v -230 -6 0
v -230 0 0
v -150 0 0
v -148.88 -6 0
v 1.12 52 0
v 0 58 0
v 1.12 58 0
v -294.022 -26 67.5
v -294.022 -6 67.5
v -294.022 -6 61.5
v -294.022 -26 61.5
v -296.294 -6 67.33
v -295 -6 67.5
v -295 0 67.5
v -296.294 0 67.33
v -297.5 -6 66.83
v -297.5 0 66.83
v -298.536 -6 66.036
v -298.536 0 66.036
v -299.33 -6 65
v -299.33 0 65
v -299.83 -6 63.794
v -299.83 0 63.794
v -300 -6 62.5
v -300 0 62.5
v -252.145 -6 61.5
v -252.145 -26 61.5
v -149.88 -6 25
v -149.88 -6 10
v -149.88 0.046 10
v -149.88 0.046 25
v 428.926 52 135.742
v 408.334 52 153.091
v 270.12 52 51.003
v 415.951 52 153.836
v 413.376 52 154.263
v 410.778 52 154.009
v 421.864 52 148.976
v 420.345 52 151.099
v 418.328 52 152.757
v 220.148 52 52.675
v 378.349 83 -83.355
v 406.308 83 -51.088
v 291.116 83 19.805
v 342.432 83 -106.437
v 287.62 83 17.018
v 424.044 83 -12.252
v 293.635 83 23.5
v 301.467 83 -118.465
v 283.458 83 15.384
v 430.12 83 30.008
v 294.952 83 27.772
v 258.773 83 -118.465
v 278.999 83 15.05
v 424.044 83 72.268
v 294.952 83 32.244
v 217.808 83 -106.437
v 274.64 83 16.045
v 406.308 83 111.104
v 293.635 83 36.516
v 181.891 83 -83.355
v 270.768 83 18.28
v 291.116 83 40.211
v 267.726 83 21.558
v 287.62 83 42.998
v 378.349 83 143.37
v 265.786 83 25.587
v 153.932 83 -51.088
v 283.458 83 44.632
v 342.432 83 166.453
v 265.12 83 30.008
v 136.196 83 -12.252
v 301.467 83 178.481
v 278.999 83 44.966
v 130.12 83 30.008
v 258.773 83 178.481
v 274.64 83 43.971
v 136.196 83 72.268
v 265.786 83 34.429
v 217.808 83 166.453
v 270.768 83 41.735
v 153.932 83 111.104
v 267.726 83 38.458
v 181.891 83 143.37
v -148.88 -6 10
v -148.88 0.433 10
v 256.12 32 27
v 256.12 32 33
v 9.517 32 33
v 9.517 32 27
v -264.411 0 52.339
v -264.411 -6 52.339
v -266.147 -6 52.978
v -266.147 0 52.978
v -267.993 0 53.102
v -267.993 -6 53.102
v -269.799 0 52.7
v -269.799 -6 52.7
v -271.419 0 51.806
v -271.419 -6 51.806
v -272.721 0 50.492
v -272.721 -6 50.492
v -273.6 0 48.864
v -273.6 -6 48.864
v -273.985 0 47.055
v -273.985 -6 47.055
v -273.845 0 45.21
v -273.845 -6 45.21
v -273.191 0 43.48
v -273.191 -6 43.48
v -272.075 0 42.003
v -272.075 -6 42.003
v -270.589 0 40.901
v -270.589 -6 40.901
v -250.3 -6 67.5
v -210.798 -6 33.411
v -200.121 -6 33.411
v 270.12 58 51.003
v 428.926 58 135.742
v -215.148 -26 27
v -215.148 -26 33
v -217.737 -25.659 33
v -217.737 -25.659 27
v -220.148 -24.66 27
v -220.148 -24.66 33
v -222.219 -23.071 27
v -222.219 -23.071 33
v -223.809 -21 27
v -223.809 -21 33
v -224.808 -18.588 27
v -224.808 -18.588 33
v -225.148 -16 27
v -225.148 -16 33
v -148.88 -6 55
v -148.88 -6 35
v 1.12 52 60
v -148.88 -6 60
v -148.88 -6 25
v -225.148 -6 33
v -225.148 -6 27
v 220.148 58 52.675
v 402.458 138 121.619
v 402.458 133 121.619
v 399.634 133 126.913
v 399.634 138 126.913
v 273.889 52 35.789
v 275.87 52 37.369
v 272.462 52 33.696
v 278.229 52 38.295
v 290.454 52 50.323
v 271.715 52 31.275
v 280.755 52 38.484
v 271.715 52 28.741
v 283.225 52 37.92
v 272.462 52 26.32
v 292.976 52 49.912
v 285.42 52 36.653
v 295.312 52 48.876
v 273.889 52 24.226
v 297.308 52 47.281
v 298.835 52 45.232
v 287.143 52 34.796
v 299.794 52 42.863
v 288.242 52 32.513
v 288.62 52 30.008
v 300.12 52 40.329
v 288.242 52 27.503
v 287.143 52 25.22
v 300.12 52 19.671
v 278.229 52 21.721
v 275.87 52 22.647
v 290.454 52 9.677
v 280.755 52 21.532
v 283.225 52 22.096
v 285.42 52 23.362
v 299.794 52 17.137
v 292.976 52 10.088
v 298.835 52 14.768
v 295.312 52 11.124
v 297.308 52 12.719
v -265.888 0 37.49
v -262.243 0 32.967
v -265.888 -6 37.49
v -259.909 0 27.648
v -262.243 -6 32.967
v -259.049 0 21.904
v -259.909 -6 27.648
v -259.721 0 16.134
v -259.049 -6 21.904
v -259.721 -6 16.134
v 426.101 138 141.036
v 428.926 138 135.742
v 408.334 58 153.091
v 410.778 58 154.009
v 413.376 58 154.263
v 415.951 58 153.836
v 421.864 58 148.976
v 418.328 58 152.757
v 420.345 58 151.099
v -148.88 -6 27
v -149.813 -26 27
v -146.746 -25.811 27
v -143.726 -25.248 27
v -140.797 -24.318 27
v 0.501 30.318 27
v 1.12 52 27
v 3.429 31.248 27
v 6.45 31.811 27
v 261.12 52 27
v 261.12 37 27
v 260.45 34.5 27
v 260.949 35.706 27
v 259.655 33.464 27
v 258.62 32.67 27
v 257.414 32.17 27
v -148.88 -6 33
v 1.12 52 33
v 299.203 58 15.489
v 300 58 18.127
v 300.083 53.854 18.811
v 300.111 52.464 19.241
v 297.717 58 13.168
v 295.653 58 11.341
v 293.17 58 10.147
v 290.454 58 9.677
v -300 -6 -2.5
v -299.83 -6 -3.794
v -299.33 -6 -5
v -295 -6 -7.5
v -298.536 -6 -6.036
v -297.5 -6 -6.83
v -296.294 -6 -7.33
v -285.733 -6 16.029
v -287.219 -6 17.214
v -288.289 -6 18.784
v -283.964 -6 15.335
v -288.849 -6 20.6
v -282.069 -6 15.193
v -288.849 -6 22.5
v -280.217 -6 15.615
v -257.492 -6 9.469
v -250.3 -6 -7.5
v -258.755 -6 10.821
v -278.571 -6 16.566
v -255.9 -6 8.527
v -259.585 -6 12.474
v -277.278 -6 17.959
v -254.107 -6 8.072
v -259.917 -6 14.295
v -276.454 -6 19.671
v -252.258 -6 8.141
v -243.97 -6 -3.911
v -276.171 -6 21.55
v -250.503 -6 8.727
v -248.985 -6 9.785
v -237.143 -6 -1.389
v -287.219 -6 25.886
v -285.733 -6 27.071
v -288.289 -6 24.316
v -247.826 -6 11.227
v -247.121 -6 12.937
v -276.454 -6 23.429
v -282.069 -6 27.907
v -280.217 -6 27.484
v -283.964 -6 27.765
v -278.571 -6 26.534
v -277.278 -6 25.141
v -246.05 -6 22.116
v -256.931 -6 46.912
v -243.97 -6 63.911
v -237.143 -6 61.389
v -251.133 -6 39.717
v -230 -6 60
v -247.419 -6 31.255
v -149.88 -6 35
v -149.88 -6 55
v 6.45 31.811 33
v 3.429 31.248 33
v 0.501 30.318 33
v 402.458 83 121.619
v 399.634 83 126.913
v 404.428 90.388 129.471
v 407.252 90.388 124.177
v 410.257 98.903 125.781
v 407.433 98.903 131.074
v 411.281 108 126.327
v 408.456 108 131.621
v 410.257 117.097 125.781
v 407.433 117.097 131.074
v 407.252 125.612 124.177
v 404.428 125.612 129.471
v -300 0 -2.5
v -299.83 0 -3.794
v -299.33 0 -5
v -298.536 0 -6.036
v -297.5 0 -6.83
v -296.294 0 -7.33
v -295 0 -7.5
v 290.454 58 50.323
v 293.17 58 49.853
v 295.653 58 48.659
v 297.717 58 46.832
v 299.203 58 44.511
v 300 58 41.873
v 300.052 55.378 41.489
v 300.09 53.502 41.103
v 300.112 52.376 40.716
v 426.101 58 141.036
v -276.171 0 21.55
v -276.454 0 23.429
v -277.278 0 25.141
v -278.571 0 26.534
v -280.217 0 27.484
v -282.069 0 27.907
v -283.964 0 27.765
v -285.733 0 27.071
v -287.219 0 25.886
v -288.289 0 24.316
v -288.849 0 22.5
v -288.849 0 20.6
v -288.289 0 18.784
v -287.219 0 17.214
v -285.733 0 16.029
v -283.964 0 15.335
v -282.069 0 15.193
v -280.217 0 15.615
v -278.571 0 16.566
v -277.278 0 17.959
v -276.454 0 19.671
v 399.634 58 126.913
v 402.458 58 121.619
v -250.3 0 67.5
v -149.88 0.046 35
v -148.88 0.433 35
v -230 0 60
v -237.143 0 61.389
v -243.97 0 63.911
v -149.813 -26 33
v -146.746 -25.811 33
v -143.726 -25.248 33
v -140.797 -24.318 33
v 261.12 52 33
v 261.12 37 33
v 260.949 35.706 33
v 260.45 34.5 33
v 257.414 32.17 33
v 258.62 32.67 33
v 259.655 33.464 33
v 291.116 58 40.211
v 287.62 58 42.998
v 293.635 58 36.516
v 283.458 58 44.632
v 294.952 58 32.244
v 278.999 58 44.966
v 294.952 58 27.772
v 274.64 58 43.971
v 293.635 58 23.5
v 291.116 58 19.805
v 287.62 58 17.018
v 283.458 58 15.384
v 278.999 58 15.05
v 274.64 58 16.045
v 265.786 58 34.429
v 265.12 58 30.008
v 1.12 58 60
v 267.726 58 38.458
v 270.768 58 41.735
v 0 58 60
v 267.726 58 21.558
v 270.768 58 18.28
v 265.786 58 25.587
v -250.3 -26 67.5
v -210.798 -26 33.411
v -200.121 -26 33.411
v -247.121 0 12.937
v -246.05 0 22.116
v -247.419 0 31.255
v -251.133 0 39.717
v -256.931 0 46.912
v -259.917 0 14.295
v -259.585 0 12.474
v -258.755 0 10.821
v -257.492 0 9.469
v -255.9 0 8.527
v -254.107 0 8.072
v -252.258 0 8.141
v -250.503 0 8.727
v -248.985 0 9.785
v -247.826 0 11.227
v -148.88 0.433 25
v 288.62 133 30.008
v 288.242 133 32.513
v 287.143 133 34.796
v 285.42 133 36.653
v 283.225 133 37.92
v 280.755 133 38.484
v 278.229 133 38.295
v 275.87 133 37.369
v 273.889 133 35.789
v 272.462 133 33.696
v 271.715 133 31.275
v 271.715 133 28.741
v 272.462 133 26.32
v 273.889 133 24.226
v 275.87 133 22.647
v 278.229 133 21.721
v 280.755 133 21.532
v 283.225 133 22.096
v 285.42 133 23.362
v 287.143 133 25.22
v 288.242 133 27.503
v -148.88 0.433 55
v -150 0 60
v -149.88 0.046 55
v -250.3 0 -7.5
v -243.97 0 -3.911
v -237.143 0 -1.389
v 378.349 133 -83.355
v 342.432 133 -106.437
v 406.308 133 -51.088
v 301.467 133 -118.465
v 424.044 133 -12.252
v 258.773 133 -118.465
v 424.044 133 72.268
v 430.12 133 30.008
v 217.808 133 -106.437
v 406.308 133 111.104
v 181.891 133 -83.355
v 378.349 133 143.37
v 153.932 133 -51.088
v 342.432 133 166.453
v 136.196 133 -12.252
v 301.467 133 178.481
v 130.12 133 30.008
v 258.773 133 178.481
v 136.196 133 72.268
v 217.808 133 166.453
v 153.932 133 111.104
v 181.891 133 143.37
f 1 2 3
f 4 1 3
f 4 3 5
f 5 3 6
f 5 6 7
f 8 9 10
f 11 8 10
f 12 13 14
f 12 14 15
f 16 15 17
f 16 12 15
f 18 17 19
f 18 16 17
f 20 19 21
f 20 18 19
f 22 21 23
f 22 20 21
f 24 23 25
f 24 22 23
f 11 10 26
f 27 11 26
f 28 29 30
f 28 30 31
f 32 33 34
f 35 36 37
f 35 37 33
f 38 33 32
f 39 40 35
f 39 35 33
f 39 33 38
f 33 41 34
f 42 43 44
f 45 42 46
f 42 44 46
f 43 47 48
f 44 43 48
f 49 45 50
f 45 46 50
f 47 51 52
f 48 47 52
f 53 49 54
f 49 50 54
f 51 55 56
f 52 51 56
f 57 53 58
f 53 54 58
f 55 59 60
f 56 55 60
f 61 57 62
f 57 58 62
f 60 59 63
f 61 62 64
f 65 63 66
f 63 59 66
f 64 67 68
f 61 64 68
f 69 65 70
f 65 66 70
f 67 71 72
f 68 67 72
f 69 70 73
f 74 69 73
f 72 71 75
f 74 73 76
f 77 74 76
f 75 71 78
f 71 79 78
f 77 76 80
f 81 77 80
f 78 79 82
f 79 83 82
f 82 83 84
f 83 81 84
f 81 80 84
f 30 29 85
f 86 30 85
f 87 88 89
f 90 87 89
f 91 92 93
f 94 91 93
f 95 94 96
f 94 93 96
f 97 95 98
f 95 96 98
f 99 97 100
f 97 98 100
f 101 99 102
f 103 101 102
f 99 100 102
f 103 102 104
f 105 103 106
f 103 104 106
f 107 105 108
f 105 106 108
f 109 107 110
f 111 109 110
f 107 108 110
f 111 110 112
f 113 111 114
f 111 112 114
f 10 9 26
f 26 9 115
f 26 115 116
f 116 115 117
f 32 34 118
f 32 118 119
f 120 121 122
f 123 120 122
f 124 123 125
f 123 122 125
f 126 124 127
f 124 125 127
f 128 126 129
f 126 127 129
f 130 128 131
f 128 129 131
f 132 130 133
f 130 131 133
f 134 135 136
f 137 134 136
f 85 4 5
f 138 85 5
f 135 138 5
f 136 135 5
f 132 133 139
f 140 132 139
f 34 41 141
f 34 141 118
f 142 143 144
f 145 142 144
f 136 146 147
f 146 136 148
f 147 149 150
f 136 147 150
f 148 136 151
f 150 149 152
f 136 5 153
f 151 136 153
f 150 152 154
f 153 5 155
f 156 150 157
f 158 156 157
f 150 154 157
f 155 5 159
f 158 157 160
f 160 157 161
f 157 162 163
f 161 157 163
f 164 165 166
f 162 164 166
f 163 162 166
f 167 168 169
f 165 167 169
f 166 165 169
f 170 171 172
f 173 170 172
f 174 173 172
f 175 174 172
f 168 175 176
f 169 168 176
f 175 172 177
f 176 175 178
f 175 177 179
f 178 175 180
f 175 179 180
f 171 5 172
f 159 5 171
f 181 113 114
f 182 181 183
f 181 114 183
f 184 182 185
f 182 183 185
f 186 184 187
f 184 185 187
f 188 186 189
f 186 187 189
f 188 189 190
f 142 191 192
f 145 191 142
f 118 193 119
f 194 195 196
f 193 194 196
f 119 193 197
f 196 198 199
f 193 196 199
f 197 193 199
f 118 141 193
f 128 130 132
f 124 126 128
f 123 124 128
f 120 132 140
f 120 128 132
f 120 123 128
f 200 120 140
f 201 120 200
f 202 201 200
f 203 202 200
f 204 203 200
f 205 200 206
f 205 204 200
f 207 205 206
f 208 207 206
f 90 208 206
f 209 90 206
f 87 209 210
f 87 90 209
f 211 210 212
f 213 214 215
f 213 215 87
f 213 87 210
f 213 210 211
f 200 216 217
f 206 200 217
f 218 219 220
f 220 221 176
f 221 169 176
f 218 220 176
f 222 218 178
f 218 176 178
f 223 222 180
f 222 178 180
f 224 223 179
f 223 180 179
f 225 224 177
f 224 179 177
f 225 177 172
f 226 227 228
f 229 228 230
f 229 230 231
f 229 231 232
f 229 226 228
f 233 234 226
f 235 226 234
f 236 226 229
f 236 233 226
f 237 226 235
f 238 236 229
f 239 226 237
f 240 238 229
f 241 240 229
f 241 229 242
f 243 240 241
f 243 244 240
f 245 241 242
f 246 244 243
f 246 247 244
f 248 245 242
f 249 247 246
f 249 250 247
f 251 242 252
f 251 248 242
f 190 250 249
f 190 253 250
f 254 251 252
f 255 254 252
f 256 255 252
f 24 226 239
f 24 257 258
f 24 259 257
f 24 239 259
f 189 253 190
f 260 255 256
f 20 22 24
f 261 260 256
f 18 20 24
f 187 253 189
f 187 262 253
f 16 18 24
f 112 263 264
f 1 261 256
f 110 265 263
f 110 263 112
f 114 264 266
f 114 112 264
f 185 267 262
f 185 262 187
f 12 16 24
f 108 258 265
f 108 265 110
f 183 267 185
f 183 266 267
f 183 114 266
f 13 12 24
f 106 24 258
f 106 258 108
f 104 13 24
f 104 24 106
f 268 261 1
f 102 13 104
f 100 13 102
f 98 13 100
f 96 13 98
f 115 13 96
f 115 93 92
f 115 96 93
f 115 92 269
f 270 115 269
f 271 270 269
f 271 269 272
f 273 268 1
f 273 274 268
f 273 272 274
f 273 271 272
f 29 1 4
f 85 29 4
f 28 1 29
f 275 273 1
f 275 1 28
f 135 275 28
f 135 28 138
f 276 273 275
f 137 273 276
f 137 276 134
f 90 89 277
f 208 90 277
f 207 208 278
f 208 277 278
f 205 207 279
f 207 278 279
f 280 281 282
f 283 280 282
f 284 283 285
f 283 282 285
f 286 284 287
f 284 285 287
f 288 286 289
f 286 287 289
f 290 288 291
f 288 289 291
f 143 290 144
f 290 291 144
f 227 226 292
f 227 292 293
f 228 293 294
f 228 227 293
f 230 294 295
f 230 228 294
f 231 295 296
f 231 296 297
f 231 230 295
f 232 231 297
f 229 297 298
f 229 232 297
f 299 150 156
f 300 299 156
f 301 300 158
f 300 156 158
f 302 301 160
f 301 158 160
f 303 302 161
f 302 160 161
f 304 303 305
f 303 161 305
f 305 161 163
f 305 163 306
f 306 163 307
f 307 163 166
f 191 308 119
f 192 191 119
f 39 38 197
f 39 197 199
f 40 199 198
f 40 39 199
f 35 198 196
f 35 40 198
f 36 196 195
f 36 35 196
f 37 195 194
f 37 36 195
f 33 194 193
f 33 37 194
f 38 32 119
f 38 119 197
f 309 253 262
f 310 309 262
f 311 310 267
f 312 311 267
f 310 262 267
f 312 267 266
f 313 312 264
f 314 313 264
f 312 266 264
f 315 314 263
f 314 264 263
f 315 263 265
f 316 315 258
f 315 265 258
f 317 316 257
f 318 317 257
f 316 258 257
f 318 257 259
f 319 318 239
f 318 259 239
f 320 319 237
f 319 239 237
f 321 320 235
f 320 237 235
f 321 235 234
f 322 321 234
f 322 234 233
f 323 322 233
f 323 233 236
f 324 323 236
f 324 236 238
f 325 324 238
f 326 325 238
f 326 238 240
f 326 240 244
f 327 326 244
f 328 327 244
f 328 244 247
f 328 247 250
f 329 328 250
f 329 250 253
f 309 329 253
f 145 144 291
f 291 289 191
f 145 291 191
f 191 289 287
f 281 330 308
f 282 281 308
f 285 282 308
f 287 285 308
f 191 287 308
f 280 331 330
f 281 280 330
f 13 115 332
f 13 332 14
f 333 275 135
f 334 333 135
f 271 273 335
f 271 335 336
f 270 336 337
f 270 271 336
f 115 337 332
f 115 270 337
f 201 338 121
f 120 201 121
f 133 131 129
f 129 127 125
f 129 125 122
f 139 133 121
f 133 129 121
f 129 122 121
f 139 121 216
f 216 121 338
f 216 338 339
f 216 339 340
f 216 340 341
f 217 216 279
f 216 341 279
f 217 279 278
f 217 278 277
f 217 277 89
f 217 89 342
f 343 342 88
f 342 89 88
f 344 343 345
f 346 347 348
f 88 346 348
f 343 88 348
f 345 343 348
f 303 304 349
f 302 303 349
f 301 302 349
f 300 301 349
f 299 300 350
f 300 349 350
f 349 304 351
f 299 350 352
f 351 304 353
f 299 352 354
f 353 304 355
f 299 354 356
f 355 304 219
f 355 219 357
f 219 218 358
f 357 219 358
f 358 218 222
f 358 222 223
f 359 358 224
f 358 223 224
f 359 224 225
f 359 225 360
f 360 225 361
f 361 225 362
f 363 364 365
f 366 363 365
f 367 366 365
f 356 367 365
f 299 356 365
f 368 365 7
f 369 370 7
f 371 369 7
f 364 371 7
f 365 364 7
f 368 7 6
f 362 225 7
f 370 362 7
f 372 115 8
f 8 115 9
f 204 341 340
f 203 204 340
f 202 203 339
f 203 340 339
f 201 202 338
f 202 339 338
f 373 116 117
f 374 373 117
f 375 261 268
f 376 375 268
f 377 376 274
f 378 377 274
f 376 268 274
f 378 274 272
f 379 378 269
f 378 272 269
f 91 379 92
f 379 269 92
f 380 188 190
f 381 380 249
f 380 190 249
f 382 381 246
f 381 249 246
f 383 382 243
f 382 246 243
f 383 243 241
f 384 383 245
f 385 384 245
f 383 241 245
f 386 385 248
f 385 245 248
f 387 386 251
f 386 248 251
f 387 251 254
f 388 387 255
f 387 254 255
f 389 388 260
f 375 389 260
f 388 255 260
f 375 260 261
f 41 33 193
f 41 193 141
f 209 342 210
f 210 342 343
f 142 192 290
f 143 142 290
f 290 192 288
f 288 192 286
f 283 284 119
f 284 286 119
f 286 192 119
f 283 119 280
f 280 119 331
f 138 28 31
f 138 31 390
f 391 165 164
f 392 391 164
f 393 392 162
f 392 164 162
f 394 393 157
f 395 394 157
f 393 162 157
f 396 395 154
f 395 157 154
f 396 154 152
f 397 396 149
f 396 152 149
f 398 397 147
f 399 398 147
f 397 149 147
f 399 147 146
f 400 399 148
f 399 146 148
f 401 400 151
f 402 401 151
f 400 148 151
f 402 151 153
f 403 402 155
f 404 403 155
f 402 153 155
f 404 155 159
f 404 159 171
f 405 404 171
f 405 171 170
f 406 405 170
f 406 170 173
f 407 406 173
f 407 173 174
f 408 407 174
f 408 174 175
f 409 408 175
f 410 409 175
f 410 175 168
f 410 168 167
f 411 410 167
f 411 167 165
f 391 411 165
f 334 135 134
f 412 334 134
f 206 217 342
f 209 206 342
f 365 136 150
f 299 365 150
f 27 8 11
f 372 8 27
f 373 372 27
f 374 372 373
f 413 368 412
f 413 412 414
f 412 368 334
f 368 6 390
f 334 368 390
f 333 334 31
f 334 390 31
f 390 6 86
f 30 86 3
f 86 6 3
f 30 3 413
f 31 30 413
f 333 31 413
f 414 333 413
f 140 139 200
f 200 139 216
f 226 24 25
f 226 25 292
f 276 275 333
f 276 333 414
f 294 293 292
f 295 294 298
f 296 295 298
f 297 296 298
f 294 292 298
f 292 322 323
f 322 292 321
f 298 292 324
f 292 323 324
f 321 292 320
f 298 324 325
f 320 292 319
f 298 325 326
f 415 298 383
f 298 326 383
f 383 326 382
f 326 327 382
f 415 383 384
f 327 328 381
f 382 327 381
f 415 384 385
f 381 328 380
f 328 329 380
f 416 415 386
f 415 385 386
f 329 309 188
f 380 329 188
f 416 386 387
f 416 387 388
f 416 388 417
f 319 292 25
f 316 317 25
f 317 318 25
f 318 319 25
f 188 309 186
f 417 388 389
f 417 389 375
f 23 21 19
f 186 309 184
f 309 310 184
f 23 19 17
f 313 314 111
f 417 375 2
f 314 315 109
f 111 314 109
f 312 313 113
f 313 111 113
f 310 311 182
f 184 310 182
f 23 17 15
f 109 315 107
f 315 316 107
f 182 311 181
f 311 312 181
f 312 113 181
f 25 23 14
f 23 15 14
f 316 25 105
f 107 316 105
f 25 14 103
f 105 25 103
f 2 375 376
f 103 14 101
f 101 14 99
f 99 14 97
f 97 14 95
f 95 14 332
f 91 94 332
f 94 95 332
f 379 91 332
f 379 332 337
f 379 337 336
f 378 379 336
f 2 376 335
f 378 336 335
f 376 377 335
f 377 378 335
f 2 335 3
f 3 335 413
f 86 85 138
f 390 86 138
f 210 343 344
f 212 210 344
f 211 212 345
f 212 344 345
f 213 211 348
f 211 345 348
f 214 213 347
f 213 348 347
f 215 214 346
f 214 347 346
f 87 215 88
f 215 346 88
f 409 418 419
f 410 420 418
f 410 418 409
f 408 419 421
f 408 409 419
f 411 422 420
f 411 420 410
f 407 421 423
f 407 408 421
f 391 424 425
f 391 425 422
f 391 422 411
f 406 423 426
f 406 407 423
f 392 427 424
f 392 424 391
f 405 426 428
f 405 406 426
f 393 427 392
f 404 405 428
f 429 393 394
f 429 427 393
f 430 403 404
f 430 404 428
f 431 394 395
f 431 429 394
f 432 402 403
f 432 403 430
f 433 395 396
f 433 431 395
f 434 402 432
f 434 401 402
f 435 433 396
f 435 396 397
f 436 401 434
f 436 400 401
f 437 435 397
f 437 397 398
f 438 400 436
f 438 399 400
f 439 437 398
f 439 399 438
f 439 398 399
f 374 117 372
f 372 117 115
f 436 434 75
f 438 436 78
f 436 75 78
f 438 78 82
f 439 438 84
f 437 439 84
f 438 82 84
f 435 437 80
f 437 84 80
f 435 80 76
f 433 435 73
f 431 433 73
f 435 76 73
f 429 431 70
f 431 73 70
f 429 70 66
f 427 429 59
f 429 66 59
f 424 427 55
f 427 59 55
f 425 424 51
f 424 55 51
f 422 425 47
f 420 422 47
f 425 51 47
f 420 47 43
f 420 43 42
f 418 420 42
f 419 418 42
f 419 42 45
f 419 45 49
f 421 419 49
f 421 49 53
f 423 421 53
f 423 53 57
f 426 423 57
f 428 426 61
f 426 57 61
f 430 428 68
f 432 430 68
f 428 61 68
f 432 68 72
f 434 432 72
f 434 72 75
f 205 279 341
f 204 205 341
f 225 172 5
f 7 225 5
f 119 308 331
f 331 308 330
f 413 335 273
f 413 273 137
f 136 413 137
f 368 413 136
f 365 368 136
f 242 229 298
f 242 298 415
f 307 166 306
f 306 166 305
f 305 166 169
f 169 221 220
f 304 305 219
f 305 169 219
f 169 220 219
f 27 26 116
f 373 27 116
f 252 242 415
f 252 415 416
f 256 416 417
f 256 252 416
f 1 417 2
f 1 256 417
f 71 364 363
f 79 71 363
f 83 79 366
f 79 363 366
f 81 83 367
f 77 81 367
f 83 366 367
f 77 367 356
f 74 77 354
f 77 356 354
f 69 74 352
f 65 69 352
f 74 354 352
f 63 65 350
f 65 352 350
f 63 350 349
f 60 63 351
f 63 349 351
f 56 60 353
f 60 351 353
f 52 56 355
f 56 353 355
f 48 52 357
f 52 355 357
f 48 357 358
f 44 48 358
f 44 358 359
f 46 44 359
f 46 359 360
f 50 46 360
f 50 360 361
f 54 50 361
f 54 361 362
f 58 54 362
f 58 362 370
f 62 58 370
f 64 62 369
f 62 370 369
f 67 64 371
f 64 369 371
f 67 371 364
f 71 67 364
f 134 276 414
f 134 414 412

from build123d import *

# Parameters (mm, degrees)
F1_DEPTH  = 60
F3_R      = 8.25
F4_DEPTH  = 25
F5_DEPTH  = 6
F6_R      = 6.375
F7_DEPTH  = 25
F10_DEPTH = 6
F11_DEPTH = 6
F12_DEPTH = 25
F13_DEPTH = 25
F14_W     = 1
F14_H     = 20
F14_H_2   = 15
F15_DEPTH = 25
F17_DEPTH = 20
F18_R     = 15
F19_DEPTH = 25
F21_DEPTH = 50
F23_DEPTH = 6
F25_DEPTH = 80
F27_DEPTH = 25
F28_R     = 8.5
F29_DEPTH = 86.001


# Not quite as in the source:
# - a feature names something its author has since deleted; it is built from what else it names


with BuildPart() as f1:
    # F0 (on Top) → F1 (new body)
    with BuildSketch(Plane.XY):
        Polygon((-150, 0), (-300, 0), (-300, -6), (-148.8803913162, -6), (1.1196086838, 52), (300.12, 52), (300, 58), (0, 58), align=None)
    extrude(amount=F1_DEPTH)

    # F3 (on face) → F4 (cut)
    with BuildSketch(Plane.XZ.offset(-52)):
        with BuildLine():
            Line((300.12, 60), (1.1196086838, 60))
            Line((1.1196086838, 60), (290.4542608309, 50.3232684455))
            ThreePointArc((290.4542608309, 50.3232684455), (297.3082754646, 47.2807408597), (300.12, 40.3288565219))
            Line((300.12, 40.3288565219), (300.12, 60))
        make_face()
        with BuildLine():
            Line((290.4542608309, 9.6767315545), (1.1196086838, 0))
            Line((1.1196086838, 0), (300.12, 0))
            Line((300.12, 0), (300.12, 19.6711434781))
            ThreePointArc((300.12, 19.6711434781), (297.3082754646, 12.7192591403), (290.4542608309, 9.6767315545))
        make_face()
        with Locations((280.12, 30.0079316213)):
            Circle(F3_R)
    extrude(amount=-F4_DEPTH, mode=Mode.SUBTRACT)

    # F2 (on face) → F5 (join)
    with BuildSketch(Plane.XZ.offset(6)):
        with BuildLine():
            Line((-250.3, 67.5), (-295, 67.5))
            ThreePointArc((-295, 67.5), (-298.5355339059, 66.0355339059), (-300, 62.5))
            Line((-300, 62.5), (-300, 60))
            Line((-300, 60), (-230, 60))
            ThreePointArc((-230, 60), (-240.6075702178, 62.5115099439), (-250.3, 67.5))
        make_face()
    extrude(amount=-F5_DEPTH)

    # F6 (on face) → F7 (cut)
    with BuildSketch(Plane.XZ.offset(6)):
        with BuildLine():
            ThreePointArc((-259.7213383401, 16.1343621796), (-255.0196238496, 8.2353824448), (-247.1206441149, 12.9370969353))
            ThreePointArc((-247.1206441149, 12.9370969353), (-248.9955051627, 35.6089750865), (-264.4106548881, 52.339256668))
            ThreePointArc((-264.4106548881, 52.339256668), (-273.2189113282, 49.7096904517), (-270.5893451119, 40.9014340116))
            ThreePointArc((-270.5893451119, 40.9014340116), (-260.8998224273, 30.3852570175), (-259.7213383401, 16.1343621796))
        make_face()
        with Locations((-282.545583065, 21.5497146659)):
            Circle(F6_R)
    extrude(amount=-F7_DEPTH, mode=Mode.SUBTRACT)

    # F2 (on face) → F11 (join)
    with BuildSketch(Plane.XZ.offset(6)):
        with BuildLine():
            Line((-250.3, 67.5), (-295, 67.5))
            ThreePointArc((-295, 67.5), (-298.5355339059, 66.0355339059), (-300, 62.5))
            Line((-300, 62.5), (-300, 60))
            Line((-300, 60), (-300, 0))
            Line((-300, 0), (-300, -2.5))
            ThreePointArc((-300, -2.5), (-298.5355339059, -6.0355339059), (-295, -7.5))
            Line((-295, -7.5), (-250.3, -7.5))
            ThreePointArc((-250.3, -7.5), (-240.6075702178, -2.5115099439), (-230, 0))
            Line((-230, 0), (-230, 60))
            ThreePointArc((-230, 60), (-240.6075702178, 62.5115099439), (-250.3, 67.5))
        make_face()
    extrude(amount=-F11_DEPTH)

    # F6 (on face) → F12 (cut)
    with BuildSketch(Plane.XZ.offset(6)):
        with BuildLine():
            ThreePointArc((-259.7213383401, 16.1343621796), (-255.0196238496, 8.2353824448), (-247.1206441149, 12.9370969353))
            ThreePointArc((-247.1206441149, 12.9370969353), (-248.9955051627, 35.6089750865), (-264.4106548881, 52.339256668))
            ThreePointArc((-264.4106548881, 52.339256668), (-273.2189113282, 49.7096904517), (-270.5893451119, 40.9014340116))
            ThreePointArc((-270.5893451119, 40.9014340116), (-260.8998224273, 30.3852570175), (-259.7213383401, 16.1343621796))
        make_face()
        with Locations((-282.545583065, 21.5497146659)):
            Circle(F6_R)
    extrude(amount=-F12_DEPTH, mode=Mode.SUBTRACT)

    # F6 (on face) → F13 (cut)
    with BuildSketch(Plane.XZ.offset(6)):
        with BuildLine():
            ThreePointArc((-259.7213383401, 16.1343621796), (-255.0196238496, 8.2353824448), (-247.1206441149, 12.9370969353))
            ThreePointArc((-247.1206441149, 12.9370969353), (-248.9955051627, 35.6089750865), (-264.4106548881, 52.339256668))
            ThreePointArc((-264.4106548881, 52.339256668), (-273.2189113282, 49.7096904517), (-270.5893451119, 40.9014340116))
            ThreePointArc((-270.5893451119, 40.9014340116), (-260.8998224273, 30.3852570175), (-259.7213383401, 16.1343621796))
        make_face()
        with Locations((-282.545583065, 21.5497146659)):
            Circle(F6_R)
    extrude(amount=-F13_DEPTH, mode=Mode.SUBTRACT)

    # F14 (on face) → F15 (cut)
    with BuildSketch(Plane.XZ.offset(6)):
        with Locations((-149.3803913162, 45)):
            Rectangle(F14_W, F14_H)
        with Locations((-149.3803913162, 17.5)):
            Rectangle(F14_W, F14_H_2)
    extrude(amount=-F15_DEPTH, mode=Mode.SUBTRACT)

    # F18 (on face) → F19 (join)
    with BuildSketch(Plane(origin=(0, 58, 0), x_dir=(-1, 0, 0), z_dir=(0, 1, 0))):
        with Locations((-280.12, 30.0079316213)):
            Circle(F18_R)
    extrude(amount=F19_DEPTH)

    # F20 (on face) → F21 (join)
    with BuildSketch(Plane(origin=(0, 83, 0), x_dir=(-1, 0, 0), z_dir=(0, 1, 0))):
        with BuildLine():
            ThreePointArc((-306.8151369112, 177.6133843163), (-376.2858189362, -85.1099873502), (-130.12, 30.0079316213))
            ThreePointArc((-130.12, 30.0079316213), (-183.9541810638, 145.1258505929), (-306.8151369112, 177.6133843163))
        make_face()
    extrude(amount=F21_DEPTH)

    # F28 (on face) → F29 (cut, through all)
    with BuildSketch(Plane.XZ.offset(-52)):
        with Locations((280.12, 30.0079316213)):
            Circle(F28_R)
    extrude(amount=-F29_DEPTH, mode=Mode.SUBTRACT)


with BuildPart() as f10:
    # F9 (on offset) → F10 (new body)
    with BuildSketch(Plane(origin=(0, 0, 33), x_dir=(1, 0, 0), z_dir=(0, 0, -1))):
        with BuildLine():
            Line((-225.14836237, 16), (-225.14836237, 6))
            Line((-225.14836237, 6), (-148.8803913162, 6))
            Line((-148.8803913162, 6), (1.1196086838, -52))
            Line((1.1196086838, -52), (261.1196086838, -52))
            Line((261.1196086838, -52), (261.1196086838, -37))
            ThreePointArc((261.1196086838, -37), (259.6551425898, -33.4644660941), (256.1196086838, -32))
            Line((256.1196086838, -32), (9.5166738126, -32))
            ThreePointArc((9.5166738126, -32), (4.930794843, -31.5757952888), (0.5005439906, -30.3175771261))
            Line((0.5005439906, -30.3175771261), (-140.7972687306, 24.3175771261))
            ThreePointArc((-140.7972687306, 24.3175771261), (-145.2275195831, 25.5757952888), (-149.8133985527, 26))
            Line((-149.8133985527, 26), (-215.14836237, 26))
            ThreePointArc((-215.14836237, 26), (-222.2194301819, 23.0710678119), (-225.14836237, 16))
        make_face()
    extrude(amount=F10_DEPTH)


with BuildPart() as f17:
    # F16 (on face) → F17 (new body)
    with BuildSketch(Plane.XZ.offset(6)):
        Polygon((-250.3, 67.5), (-294.0215170383, 67.5), (-294.0215170383, 61.5), (-252.1453078549, 61.5), (-210.7984625637, 33.4105253768), (-200.1213386967, 33.4105253768), align=None)
    extrude(amount=F17_DEPTH)


with BuildPart() as f23:
    # F22 (on face) → F23 (new body)
    with BuildSketch(Plane.XZ.offset(-52)):
        with BuildLine():
            Line((270.12, 51.0033431685), (428.9258106677, 135.7424398015))
            Line((428.9258106677, 135.7424398015), (421.8642192816, 148.9762573572))
            ThreePointArc((421.8642192816, 148.9762573572), (415.9512895642, 153.8358772929), (408.3339466538, 153.0910748035))
            Line((408.3339466538, 153.0910748035), (220.1479403824, 52.6746473229))
            Line((220.1479403824, 52.6746473229), (270.12, 51.0033431685))
        make_face()
    extrude(amount=-F23_DEPTH)


with BuildPart() as f25:
    # F24 (on face) → F25 (new body)
    with BuildSketch(Plane(origin=(0, 58, 0), x_dir=(-1, 0, 0), z_dir=(0, 1, 0))):
        Polygon((-426.1011741132, 141.0359668238), (-428.9258106677, 135.7424398015), (-402.4581755564, 121.6192570294), (-399.633539002, 126.9127840516), align=None)
    extrude(amount=F25_DEPTH)

    # F26 (on face) → F27 (cut)
    with BuildSketch(Plane(origin=(35.8574468804, 0, -67.1988627041), x_dir=(0.8822545037, 0, 0.4707727591), z_dir=(-0.4707727591, 0, 0.8822545037))):
        with BuildLine():
            Line((412.3255711273, 133), (412.3255711273, 83))
            ThreePointArc((412.3255711273, 83), (422.3255711273, 108), (412.3255711273, 133))
        make_face()
    extrude(amount=-F27_DEPTH, mode=Mode.SUBTRACT)


solid = Compound([f1.part, f10.part, f17.part, f23.part, f25.part])
